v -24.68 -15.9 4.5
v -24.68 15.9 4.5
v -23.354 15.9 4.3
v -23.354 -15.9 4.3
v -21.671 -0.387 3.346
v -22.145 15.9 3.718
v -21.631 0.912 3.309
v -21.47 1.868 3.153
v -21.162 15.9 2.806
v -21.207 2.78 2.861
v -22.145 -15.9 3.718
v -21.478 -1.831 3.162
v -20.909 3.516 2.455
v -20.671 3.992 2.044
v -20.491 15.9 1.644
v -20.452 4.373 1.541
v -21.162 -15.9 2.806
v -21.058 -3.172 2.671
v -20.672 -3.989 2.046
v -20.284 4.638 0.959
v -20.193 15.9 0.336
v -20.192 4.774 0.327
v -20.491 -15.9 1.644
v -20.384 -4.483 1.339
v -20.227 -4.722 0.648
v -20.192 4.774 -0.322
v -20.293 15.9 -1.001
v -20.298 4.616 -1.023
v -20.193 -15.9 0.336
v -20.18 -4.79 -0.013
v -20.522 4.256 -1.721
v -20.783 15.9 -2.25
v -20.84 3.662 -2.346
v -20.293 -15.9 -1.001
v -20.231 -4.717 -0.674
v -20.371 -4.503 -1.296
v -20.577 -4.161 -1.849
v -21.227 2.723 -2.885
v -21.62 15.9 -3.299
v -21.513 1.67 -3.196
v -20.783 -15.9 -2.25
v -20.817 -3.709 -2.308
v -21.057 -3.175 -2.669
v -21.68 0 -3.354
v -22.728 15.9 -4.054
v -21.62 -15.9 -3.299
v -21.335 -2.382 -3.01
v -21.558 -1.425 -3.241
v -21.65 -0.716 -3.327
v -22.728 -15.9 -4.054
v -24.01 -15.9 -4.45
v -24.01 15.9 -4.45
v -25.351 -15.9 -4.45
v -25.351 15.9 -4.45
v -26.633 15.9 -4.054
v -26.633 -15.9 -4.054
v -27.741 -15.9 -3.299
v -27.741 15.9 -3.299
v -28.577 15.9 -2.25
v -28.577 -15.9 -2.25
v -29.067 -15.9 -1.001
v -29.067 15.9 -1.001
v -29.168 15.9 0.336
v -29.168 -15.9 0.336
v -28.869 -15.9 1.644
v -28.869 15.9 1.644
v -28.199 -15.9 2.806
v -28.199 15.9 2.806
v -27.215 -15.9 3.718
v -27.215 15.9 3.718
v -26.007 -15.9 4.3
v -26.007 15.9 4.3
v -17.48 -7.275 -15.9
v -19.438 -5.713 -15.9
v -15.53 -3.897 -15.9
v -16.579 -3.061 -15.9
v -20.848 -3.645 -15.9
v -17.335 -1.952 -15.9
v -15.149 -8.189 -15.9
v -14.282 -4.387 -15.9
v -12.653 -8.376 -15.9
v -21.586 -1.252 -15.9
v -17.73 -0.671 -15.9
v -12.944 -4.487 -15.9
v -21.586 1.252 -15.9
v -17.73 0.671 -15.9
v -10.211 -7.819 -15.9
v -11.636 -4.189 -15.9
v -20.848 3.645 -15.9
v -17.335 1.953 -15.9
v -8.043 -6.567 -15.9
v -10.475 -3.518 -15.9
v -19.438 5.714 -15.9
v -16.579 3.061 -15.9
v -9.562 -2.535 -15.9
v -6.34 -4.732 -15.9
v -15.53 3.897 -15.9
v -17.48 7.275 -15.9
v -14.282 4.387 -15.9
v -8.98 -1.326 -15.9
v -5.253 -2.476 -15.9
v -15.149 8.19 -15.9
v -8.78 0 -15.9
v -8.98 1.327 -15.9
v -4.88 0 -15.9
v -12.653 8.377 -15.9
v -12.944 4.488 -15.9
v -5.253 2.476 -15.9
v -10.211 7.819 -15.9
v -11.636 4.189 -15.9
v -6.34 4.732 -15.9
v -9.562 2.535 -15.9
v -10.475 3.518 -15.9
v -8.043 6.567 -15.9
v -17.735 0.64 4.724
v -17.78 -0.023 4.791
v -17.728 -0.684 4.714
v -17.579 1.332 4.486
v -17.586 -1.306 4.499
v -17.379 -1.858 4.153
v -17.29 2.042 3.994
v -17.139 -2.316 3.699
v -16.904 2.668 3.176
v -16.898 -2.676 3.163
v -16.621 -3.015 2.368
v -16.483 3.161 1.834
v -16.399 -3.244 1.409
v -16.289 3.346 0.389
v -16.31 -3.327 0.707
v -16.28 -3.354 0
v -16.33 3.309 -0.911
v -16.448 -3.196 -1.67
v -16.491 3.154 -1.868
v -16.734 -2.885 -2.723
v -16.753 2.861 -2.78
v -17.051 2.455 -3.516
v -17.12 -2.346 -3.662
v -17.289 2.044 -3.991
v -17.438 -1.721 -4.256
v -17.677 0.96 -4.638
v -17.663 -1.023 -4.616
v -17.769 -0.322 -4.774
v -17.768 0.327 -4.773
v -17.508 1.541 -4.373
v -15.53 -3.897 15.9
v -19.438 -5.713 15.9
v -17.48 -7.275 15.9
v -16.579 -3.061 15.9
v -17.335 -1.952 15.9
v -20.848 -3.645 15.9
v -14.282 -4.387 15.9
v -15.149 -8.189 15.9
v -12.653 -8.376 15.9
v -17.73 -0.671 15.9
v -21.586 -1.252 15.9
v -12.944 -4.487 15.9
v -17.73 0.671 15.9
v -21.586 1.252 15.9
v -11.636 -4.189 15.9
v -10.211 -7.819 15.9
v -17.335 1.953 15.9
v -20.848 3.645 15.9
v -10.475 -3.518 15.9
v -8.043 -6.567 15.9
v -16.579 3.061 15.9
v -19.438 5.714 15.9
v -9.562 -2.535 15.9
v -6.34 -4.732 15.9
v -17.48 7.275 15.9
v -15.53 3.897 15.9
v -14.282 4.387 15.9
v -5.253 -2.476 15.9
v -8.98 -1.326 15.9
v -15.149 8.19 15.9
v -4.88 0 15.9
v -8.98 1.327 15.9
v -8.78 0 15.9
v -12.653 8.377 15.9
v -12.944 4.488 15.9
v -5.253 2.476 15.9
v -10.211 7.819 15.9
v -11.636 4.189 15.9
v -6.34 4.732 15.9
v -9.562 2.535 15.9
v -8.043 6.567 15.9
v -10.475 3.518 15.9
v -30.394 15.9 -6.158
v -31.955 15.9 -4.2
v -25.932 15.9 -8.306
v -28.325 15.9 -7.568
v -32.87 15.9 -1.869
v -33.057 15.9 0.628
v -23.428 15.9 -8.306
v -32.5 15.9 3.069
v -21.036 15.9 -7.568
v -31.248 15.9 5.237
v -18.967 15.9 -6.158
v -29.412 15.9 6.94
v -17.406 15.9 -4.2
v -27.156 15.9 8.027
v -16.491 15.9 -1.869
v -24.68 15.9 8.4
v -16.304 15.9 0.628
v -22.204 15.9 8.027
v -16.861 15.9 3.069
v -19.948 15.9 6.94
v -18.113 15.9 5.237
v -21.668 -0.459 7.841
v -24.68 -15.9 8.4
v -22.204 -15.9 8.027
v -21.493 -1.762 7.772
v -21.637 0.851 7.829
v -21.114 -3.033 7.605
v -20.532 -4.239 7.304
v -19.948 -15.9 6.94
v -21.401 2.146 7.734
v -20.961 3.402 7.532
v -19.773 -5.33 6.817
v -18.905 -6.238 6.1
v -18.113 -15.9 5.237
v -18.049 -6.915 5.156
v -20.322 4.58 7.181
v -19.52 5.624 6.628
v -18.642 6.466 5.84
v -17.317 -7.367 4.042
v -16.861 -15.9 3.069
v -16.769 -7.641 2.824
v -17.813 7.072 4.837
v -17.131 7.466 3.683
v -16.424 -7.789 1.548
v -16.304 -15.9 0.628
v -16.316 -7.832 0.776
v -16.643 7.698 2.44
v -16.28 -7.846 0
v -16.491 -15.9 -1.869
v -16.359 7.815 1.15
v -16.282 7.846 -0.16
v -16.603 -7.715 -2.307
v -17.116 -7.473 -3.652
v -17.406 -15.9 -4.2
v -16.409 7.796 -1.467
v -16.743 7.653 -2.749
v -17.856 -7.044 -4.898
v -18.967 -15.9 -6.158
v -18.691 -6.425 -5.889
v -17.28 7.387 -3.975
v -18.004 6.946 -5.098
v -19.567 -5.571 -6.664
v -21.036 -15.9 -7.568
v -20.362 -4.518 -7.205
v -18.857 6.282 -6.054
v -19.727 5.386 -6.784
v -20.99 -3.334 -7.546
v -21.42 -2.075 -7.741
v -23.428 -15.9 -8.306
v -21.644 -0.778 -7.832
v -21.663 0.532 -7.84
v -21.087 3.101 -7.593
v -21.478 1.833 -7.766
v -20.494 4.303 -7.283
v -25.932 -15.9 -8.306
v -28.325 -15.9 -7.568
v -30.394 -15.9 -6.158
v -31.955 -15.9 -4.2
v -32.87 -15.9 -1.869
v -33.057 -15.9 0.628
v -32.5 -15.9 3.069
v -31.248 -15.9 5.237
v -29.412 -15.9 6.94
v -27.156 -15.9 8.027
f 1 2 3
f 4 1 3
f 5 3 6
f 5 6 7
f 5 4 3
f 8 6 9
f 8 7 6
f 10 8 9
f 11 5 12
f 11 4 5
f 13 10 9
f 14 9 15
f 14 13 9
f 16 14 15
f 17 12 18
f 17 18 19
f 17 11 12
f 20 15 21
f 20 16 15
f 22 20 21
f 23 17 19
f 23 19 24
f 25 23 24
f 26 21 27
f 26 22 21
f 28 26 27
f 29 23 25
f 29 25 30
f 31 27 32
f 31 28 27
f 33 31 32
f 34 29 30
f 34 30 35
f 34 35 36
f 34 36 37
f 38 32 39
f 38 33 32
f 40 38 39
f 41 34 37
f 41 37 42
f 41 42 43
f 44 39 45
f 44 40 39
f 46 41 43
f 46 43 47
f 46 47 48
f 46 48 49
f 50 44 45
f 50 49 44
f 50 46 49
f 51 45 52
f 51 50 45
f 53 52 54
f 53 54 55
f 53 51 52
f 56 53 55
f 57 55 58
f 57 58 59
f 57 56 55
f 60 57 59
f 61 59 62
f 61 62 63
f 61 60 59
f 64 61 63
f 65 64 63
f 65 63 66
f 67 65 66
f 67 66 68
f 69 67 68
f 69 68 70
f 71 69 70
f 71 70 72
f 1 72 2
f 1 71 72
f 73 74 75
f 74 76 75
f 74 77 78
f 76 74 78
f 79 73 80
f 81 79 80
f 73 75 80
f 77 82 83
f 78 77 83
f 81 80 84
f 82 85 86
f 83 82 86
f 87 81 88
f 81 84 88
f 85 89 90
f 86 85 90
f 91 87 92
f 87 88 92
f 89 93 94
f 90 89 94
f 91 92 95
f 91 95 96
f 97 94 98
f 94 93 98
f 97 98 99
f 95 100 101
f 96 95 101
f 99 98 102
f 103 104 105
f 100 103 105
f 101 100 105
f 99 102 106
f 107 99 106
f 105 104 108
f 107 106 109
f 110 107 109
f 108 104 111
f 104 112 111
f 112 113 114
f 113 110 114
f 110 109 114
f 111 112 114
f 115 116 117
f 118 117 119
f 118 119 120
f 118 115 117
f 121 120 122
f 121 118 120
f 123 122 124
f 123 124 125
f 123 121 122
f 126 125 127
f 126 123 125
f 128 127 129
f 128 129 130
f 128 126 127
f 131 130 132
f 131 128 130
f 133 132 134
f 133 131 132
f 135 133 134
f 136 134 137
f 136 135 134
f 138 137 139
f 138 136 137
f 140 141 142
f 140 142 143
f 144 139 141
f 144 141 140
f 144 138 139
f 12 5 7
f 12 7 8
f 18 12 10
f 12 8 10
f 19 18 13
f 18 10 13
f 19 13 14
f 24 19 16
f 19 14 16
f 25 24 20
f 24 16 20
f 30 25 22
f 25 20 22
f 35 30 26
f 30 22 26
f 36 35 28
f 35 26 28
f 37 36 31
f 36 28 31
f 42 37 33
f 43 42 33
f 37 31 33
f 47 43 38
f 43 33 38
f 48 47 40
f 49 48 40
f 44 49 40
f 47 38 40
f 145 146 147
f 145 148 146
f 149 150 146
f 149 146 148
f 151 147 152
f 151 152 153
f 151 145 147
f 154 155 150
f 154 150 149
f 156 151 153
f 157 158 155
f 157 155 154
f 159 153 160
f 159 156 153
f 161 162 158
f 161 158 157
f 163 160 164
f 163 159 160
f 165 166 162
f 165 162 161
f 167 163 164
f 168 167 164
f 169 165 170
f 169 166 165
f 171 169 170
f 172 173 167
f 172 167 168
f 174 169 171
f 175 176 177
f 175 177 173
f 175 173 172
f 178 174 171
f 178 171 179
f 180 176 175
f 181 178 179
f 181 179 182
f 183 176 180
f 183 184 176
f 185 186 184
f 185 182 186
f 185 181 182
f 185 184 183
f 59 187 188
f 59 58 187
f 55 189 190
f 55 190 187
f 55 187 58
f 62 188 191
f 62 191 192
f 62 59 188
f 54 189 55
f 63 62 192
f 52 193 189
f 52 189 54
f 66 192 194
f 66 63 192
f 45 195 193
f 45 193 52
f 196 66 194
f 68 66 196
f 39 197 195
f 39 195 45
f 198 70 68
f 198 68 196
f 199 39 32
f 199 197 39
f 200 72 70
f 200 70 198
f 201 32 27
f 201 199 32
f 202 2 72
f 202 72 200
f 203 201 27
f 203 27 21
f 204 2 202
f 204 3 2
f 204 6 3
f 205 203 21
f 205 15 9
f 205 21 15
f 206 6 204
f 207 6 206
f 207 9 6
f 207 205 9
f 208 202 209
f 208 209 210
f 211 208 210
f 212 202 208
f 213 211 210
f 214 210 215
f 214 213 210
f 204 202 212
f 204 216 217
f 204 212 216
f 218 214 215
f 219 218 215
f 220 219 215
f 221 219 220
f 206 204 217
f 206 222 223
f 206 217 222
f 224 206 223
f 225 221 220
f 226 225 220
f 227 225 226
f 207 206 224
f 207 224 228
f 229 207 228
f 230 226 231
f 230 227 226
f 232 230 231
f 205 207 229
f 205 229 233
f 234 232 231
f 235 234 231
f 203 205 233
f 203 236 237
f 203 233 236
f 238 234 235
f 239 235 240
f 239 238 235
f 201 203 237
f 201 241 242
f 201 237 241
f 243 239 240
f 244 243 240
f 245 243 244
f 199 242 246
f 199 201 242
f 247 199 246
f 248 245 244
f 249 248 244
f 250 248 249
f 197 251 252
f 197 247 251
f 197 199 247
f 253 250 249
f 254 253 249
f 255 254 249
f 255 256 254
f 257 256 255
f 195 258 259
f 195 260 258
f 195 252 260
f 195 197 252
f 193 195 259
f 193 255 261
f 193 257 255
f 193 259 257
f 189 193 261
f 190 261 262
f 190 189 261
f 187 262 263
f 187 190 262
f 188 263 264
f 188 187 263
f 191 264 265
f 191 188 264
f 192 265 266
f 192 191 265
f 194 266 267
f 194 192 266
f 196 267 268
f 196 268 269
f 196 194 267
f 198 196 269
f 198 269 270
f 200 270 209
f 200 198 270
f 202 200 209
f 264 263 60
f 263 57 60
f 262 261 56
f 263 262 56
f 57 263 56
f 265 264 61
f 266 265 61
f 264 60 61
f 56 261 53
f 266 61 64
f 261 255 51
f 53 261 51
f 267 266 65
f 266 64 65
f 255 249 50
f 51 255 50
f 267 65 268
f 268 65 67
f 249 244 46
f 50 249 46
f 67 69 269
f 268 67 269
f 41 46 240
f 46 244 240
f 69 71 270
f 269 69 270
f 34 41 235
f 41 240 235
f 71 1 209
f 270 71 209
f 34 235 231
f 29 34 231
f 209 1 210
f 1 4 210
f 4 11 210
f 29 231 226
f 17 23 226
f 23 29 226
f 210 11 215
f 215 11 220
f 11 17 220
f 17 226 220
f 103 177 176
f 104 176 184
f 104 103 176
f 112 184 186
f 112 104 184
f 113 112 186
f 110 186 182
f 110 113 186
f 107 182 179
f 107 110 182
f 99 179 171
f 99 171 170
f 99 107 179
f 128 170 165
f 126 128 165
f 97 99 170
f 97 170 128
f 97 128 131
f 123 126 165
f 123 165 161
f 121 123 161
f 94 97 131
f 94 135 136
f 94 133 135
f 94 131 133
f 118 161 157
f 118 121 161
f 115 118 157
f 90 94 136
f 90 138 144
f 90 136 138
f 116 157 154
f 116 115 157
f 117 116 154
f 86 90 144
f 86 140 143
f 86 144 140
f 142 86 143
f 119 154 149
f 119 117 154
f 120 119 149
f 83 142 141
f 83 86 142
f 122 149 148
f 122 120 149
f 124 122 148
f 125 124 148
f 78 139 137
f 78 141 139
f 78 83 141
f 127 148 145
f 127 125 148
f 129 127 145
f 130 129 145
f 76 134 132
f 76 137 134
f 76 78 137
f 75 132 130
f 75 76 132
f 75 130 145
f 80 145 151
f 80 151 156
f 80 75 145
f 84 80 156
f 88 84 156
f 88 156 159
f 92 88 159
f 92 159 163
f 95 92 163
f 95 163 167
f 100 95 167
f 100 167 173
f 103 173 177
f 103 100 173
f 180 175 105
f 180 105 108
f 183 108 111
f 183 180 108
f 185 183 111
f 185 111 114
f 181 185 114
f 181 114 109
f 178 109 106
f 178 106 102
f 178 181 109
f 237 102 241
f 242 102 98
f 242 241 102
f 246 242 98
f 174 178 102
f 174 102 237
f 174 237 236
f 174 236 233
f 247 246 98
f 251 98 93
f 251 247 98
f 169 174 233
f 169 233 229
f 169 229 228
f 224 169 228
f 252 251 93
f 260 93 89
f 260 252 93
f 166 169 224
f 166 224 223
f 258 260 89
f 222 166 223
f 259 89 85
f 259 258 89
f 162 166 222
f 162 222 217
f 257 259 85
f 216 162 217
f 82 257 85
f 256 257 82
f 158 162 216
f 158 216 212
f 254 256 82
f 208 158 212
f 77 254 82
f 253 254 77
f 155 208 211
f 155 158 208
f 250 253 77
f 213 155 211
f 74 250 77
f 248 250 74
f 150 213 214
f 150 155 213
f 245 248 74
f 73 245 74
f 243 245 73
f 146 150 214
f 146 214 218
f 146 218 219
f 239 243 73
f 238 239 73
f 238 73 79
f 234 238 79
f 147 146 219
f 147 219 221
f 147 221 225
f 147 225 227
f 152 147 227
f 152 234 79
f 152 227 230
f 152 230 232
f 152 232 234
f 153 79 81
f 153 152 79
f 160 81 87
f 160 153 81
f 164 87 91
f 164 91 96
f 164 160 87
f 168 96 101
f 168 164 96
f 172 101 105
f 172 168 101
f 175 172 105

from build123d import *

# Parameters (mm, degrees)
SKETCH1_R           = 28
SKETCH1_R_2         = 15
BOSS_EXTRUDE1_DEPTH = 53
SKETCH2_R           = 28
SKETCH2_R_2         = 15
BOSS_EXTRUDE2_DEPTH = 53
SKETCH3_R           = 15
CUT_EXTRUDE1_DEPTH  = 136.650285827
SCALE1_SCALE        = 0.3


with BuildPart() as part:
    # Sketch1 → Boss-Extrude1 (new, symmetric)
    with BuildSketch(Plane.XY):
        Circle(SKETCH1_R)
        Circle(SKETCH1_R_2, mode=Mode.SUBTRACT)
    extrude(amount=BOSS_EXTRUDE1_DEPTH, both=True)

    # Sketch2 → Boss-Extrude2 (add, symmetric)
    with BuildSketch(Plane(origin=(0, 0, 0), x_dir=(1, 0, 0), z_dir=(0, 1, 0))):
        with Locations(Location((-38, 0, 0), (0, 0, 270))):
            Circle(SKETCH2_R)
        with Locations(Location((-38, 0, 0), (0, 0, 270))):
            Circle(SKETCH2_R_2, mode=Mode.SUBTRACT)
    extrude(amount=BOSS_EXTRUDE2_DEPTH, both=True)

    # Sketch3 → Cut-Extrude1 (cut, through all)
    with BuildSketch(Plane(origin=(0, 53, 0), x_dir=(1, 0, 0), z_dir=(0, 1, 0))):
        with Locations(Location((-38, 0, 0), (0, 0, 270))):
            Circle(SKETCH3_R)
    extrude(amount=-CUT_EXTRUDE1_DEPTH, mode=Mode.SUBTRACT)


with BuildPart() as part_1:
    # Scale1: scaled about (-18.971831543, 0.000154548, 3.0881e-05)
    add(part.part.scale(SCALE1_SCALE).moved(Location((-13.28028208, 0.000108184, 2.1617e-05))))


solid = part_1.part
